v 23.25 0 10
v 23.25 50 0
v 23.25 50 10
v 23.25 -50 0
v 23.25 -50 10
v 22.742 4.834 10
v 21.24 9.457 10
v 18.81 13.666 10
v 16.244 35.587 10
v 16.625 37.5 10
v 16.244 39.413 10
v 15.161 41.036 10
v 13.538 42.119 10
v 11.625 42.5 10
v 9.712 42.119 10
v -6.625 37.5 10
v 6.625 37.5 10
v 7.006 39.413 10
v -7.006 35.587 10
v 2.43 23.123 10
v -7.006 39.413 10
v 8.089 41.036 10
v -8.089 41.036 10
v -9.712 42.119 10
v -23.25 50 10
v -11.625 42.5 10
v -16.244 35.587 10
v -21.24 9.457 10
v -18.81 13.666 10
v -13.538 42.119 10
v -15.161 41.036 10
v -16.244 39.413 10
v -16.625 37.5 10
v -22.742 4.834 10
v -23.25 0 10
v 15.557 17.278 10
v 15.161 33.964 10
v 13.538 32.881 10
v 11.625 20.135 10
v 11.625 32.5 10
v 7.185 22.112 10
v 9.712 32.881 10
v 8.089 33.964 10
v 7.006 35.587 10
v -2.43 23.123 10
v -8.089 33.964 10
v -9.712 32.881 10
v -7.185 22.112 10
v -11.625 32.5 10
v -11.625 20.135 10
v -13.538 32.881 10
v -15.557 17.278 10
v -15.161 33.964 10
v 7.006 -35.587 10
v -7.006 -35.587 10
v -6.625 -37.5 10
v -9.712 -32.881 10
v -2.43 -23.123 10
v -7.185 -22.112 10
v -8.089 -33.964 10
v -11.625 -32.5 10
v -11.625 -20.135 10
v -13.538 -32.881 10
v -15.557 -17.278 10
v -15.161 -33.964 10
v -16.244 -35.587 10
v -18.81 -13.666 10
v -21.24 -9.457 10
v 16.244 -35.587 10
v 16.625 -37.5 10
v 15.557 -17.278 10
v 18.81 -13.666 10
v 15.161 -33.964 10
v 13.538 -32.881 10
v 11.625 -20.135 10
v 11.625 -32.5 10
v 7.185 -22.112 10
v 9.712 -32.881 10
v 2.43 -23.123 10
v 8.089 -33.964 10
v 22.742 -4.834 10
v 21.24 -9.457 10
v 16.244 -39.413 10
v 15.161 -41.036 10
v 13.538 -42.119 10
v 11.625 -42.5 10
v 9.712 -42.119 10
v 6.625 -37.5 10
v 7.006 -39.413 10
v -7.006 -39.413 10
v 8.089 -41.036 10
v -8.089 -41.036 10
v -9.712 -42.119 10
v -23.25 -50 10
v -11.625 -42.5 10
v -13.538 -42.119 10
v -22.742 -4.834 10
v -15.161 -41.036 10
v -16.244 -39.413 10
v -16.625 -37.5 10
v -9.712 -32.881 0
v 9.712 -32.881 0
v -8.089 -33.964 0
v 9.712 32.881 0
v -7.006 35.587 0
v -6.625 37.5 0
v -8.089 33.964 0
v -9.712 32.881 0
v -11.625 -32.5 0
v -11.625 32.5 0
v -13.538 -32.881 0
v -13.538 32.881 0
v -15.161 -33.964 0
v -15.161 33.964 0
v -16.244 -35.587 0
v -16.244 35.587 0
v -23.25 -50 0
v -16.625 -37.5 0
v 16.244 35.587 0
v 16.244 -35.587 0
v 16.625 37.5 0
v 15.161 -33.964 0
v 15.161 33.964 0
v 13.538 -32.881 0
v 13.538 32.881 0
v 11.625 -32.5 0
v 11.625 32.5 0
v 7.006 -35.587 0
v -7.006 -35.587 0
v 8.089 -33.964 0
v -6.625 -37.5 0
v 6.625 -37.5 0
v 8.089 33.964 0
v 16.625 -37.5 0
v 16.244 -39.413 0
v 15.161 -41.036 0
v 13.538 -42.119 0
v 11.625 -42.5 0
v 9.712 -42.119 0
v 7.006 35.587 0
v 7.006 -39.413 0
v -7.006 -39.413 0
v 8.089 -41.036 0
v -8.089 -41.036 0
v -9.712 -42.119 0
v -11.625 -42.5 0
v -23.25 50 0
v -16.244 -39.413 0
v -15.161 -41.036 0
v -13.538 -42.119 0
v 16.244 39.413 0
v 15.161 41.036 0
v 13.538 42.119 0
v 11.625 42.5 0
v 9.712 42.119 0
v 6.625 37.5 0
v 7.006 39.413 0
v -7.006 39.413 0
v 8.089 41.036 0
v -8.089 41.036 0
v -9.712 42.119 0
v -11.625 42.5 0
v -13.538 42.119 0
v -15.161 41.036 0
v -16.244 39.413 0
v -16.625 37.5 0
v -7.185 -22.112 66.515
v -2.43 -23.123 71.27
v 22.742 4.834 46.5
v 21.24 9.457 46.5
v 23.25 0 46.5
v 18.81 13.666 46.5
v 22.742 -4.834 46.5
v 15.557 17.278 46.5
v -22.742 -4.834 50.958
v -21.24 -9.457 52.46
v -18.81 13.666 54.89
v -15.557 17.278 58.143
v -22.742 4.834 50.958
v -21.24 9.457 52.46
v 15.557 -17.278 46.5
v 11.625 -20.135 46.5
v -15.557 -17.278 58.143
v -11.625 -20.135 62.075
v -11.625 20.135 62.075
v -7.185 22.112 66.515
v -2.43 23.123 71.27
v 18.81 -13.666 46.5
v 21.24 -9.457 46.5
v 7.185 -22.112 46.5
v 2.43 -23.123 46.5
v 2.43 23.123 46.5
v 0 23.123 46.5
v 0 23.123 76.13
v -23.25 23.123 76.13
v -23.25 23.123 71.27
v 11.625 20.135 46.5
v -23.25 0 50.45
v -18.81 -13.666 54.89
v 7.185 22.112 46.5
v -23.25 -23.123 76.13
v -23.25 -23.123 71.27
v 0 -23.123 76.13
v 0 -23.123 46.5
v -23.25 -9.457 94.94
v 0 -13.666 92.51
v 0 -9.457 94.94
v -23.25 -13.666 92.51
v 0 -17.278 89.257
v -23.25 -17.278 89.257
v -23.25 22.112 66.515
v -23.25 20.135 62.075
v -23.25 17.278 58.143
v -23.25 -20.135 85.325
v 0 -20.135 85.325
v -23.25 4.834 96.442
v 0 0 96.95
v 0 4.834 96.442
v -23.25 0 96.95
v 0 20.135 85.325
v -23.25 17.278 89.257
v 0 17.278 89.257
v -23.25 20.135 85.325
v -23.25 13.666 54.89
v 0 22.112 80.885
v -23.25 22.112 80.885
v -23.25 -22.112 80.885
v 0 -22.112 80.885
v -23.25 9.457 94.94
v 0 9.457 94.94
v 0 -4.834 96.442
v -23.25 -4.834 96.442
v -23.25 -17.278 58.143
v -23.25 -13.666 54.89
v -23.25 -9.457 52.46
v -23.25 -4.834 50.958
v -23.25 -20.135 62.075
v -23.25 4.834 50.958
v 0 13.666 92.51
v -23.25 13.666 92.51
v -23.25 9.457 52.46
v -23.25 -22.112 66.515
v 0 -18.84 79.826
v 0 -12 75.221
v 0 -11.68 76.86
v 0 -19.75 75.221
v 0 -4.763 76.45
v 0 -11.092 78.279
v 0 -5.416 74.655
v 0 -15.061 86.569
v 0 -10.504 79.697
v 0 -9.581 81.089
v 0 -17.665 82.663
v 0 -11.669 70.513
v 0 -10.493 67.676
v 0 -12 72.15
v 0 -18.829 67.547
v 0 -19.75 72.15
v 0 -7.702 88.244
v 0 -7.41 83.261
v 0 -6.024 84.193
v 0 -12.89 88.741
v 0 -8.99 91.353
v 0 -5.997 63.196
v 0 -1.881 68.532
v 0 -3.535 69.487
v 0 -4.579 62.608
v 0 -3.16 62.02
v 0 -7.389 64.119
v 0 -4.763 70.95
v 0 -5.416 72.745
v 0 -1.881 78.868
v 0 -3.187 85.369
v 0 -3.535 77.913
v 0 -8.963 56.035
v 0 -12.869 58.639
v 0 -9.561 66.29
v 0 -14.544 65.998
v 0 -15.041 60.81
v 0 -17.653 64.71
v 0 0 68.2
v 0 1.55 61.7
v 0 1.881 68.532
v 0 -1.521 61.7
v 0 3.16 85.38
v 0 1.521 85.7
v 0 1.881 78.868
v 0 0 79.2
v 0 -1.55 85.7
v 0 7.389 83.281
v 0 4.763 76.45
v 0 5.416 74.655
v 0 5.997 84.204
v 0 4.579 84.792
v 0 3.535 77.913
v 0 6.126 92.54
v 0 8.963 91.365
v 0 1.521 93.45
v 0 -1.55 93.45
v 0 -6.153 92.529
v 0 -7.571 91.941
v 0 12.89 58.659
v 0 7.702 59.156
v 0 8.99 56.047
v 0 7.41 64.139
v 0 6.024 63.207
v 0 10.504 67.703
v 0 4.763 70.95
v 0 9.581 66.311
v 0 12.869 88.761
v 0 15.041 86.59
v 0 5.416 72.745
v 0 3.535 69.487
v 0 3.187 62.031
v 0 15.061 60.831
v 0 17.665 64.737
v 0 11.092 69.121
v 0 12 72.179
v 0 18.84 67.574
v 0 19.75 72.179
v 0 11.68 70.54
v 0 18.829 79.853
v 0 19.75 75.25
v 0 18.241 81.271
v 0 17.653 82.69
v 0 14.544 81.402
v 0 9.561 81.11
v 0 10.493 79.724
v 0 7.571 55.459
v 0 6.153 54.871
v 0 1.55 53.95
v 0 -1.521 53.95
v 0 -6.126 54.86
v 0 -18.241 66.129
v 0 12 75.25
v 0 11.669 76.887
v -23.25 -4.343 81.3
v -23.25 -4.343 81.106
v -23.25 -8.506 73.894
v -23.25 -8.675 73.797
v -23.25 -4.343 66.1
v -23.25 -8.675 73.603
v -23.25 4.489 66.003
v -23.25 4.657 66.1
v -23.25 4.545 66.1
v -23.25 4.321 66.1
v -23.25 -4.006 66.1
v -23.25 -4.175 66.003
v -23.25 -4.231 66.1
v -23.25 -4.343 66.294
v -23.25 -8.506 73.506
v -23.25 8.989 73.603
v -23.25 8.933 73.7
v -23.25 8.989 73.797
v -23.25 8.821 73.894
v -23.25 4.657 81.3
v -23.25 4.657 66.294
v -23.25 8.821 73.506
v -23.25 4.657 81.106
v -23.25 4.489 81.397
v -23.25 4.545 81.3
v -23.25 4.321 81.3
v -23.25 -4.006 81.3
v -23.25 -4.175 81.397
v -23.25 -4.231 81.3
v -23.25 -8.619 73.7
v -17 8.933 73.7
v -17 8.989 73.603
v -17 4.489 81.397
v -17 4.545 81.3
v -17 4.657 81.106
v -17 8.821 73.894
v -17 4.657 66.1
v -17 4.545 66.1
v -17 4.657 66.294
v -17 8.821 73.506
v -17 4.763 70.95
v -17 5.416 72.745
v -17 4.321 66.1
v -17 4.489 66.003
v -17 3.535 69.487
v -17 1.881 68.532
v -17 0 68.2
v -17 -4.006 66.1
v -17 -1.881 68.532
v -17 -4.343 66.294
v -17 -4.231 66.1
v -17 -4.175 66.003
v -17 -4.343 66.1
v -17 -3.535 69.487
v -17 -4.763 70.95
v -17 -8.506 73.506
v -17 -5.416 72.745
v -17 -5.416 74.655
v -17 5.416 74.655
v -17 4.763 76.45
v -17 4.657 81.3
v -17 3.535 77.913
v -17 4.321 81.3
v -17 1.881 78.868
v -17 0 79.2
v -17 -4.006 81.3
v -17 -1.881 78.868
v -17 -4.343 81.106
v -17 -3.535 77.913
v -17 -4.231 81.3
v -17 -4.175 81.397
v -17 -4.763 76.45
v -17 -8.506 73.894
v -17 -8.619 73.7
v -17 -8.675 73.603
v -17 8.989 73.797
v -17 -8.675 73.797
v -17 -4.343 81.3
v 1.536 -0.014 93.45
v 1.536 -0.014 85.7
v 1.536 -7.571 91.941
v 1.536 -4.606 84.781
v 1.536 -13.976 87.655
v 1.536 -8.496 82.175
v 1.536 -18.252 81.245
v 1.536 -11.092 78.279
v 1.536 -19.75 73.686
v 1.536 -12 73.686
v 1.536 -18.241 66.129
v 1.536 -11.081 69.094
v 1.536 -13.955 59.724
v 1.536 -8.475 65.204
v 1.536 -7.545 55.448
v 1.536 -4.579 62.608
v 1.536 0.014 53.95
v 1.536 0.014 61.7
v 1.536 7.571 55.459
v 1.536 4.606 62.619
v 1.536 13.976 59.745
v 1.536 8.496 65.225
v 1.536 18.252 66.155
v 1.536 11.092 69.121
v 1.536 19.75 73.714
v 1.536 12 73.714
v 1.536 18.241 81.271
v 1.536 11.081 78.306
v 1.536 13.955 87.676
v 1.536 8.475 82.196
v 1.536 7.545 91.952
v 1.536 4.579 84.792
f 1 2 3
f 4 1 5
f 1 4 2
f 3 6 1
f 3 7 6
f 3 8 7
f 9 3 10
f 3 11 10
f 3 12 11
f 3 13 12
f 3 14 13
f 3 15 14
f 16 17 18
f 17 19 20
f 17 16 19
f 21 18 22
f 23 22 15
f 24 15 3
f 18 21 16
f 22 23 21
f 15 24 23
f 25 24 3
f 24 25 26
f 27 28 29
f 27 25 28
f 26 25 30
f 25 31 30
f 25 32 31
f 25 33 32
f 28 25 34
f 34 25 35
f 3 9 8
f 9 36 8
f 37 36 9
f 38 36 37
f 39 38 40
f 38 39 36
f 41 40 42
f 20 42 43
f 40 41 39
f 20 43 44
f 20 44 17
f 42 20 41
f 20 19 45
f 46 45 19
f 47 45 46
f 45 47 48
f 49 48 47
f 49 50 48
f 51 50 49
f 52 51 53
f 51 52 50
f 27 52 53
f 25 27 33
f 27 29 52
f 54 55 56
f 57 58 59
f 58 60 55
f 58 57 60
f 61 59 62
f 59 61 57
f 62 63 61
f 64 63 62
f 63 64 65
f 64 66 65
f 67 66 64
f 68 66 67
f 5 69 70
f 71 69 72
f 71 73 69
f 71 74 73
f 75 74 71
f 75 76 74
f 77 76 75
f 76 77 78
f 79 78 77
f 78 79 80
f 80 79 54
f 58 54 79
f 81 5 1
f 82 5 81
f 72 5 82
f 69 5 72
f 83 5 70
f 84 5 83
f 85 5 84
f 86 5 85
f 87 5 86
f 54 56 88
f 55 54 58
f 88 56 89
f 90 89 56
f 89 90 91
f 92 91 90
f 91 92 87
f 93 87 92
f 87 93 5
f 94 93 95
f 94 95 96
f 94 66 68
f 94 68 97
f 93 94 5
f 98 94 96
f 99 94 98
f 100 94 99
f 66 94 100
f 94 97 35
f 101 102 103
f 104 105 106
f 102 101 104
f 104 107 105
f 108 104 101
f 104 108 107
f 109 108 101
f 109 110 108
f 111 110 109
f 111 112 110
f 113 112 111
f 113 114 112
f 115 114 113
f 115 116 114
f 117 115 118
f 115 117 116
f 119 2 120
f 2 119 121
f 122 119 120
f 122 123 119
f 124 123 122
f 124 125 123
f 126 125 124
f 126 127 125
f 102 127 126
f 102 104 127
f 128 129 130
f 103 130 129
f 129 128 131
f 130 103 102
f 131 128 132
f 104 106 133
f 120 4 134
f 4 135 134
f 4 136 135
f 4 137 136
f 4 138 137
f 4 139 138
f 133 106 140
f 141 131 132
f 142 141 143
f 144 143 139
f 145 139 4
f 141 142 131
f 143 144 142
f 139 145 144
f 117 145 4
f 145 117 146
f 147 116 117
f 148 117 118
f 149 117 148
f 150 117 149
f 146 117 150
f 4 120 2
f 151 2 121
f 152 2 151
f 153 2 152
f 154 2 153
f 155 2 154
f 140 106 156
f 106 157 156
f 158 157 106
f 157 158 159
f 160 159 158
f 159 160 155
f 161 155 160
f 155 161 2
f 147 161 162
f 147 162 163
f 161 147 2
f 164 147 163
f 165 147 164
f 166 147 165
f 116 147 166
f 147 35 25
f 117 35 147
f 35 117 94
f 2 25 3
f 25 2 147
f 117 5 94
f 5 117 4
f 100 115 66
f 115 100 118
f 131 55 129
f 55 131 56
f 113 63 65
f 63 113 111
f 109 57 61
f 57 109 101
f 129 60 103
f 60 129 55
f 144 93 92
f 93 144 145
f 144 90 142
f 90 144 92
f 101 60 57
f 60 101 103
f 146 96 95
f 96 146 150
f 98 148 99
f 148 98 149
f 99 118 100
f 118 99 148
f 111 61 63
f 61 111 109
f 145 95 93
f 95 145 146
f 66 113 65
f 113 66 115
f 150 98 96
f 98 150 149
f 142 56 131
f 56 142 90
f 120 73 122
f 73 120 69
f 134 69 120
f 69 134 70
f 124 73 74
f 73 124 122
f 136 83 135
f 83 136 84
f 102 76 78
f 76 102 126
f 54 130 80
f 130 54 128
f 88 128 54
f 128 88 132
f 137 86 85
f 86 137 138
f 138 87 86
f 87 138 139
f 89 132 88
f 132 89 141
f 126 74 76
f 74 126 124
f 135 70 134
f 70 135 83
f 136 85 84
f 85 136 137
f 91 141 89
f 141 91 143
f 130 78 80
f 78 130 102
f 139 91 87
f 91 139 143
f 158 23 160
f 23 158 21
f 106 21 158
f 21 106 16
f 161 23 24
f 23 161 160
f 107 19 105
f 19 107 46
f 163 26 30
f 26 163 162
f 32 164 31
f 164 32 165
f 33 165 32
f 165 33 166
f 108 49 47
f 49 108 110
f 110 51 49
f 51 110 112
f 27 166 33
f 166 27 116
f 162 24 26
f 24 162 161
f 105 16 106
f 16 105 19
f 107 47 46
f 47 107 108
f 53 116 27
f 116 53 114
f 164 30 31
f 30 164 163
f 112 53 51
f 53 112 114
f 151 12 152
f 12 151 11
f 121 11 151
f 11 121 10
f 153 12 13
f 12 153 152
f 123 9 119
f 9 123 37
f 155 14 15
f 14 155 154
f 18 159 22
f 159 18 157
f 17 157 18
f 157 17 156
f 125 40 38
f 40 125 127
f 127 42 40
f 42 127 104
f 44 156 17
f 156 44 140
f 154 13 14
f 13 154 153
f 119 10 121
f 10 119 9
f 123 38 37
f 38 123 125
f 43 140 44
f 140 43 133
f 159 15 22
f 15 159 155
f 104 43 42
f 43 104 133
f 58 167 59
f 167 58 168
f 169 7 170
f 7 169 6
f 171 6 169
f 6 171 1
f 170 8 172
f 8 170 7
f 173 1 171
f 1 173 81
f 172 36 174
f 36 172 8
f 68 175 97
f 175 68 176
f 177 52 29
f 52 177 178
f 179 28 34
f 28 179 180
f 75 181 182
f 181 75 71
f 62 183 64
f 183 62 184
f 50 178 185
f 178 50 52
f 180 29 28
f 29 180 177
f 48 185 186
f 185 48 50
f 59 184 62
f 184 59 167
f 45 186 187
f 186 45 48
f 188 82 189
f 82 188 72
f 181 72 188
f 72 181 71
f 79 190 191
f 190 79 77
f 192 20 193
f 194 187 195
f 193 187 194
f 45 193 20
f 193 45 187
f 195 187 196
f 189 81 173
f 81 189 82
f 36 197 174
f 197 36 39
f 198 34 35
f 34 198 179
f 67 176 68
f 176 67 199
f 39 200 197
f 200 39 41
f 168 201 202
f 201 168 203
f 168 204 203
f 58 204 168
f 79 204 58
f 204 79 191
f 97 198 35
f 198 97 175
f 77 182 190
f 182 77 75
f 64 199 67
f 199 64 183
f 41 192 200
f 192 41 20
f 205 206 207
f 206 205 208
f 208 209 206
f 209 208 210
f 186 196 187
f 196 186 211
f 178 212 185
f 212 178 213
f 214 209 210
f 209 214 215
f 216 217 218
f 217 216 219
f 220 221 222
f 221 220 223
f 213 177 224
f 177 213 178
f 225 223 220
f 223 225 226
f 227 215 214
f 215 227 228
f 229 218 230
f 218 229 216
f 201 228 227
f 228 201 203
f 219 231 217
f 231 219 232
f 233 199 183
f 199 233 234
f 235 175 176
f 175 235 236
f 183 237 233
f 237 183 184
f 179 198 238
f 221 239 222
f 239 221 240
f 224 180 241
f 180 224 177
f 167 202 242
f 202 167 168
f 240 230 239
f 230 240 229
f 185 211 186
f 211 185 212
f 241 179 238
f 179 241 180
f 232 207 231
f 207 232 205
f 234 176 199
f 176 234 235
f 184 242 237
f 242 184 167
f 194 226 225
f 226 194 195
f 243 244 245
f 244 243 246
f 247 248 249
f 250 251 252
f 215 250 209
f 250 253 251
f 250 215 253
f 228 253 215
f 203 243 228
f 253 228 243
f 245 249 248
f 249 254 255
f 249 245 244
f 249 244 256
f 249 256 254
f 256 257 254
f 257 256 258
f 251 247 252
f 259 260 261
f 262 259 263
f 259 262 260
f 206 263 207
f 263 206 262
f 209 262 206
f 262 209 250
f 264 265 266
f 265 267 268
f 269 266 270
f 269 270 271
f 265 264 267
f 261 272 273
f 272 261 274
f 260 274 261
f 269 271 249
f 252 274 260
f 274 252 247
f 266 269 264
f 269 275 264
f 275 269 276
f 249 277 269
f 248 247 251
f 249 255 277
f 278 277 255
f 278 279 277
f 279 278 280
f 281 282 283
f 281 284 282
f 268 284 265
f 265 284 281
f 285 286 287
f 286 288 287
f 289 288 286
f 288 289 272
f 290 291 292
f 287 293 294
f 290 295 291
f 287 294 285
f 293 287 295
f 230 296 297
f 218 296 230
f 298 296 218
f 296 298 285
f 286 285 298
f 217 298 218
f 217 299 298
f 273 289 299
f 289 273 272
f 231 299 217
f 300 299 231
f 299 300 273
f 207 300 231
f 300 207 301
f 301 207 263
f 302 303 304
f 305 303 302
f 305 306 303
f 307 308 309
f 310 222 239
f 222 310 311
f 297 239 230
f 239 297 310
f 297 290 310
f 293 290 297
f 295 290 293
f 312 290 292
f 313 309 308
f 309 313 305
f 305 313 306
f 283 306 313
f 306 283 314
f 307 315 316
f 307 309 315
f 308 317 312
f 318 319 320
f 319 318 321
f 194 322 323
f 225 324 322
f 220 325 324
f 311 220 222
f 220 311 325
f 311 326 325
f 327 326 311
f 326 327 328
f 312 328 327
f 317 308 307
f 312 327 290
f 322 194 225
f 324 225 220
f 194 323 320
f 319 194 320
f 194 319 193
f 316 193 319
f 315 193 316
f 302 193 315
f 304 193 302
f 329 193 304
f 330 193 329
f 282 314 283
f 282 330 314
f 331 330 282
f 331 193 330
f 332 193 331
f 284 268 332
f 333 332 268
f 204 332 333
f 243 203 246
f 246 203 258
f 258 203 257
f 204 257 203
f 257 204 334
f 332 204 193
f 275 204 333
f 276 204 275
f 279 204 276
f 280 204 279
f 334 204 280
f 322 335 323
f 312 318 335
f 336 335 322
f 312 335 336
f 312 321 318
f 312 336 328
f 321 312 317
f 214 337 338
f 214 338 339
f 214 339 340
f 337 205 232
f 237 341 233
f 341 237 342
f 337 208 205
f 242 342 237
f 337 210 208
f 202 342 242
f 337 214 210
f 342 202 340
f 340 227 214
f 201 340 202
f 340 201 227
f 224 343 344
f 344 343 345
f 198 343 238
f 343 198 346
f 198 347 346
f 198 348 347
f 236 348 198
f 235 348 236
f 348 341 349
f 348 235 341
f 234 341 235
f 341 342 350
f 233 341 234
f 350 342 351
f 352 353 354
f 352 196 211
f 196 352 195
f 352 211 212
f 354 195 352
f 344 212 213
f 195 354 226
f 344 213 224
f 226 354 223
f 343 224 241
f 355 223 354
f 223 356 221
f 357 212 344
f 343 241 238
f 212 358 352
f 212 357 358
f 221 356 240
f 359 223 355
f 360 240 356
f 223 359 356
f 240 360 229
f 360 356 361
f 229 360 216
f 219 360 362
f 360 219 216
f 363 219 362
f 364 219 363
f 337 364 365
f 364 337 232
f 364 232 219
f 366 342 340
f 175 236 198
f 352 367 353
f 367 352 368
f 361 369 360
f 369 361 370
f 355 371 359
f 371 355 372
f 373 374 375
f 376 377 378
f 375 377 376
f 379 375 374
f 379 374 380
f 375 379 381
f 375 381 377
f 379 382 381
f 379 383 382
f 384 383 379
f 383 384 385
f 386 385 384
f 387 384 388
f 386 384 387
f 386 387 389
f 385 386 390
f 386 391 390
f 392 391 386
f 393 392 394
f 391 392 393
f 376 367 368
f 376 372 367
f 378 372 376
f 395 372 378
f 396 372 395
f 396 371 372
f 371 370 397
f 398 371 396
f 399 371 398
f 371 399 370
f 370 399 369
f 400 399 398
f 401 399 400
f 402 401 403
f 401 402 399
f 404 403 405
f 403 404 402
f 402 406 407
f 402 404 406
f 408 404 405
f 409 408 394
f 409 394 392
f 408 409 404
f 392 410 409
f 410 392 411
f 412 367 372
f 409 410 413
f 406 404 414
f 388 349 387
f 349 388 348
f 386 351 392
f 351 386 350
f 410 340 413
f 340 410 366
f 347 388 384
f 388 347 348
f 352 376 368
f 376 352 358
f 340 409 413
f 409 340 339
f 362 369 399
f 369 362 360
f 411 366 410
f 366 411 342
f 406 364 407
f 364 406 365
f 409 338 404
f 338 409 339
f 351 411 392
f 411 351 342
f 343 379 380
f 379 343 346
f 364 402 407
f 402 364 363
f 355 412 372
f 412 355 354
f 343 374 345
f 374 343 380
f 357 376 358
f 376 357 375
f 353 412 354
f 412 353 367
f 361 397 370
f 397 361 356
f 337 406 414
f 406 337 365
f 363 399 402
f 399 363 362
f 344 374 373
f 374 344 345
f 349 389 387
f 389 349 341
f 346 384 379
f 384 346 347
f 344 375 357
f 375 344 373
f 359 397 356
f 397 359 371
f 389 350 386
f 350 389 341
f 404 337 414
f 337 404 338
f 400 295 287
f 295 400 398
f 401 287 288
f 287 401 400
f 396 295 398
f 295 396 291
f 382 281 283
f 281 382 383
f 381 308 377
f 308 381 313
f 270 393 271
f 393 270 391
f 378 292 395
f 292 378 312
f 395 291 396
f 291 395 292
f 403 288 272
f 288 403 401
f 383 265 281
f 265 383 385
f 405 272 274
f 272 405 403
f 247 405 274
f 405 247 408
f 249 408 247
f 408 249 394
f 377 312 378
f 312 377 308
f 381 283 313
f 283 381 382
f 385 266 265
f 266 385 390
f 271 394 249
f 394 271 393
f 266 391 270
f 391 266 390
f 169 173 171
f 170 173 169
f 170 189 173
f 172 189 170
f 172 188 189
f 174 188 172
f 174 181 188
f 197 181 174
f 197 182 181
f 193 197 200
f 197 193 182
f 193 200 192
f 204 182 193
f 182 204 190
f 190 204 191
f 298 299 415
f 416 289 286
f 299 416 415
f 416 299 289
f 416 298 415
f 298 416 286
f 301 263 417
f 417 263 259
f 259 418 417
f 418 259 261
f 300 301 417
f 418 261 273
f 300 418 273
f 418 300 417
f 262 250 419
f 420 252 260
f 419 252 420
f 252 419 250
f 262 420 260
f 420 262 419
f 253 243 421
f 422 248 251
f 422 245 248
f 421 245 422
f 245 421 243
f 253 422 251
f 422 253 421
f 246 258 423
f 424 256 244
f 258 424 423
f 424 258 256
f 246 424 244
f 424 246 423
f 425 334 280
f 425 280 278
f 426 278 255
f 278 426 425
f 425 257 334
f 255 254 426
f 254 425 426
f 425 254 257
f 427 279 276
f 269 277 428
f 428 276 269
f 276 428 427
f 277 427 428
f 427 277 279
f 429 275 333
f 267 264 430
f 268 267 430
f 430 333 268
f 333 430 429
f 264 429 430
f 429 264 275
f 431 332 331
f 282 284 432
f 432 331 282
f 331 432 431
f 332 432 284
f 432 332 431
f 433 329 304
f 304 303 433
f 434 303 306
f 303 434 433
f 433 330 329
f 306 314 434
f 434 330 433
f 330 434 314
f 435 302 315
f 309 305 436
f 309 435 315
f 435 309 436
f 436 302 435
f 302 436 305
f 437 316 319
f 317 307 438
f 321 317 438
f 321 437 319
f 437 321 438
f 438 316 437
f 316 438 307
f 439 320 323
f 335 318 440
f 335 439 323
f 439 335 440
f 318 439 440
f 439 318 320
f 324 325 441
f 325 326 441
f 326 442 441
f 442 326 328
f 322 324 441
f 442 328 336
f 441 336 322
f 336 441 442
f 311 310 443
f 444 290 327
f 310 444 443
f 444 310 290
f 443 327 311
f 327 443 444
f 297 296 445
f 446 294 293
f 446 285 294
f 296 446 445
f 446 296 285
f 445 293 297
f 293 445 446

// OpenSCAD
/*

    WIP Joint for connecting two lenths of PVC pipe at adjustable angles.
    
    Print with pipe opening down for best bed adhesion, lowest pipe opening
    distortion and strongest teeth.  
    
    Lots of testing remains to get fitings and clearances correct, and also
    needs work on being properly parametric as well as field testing for 
    strength, durability, etc. (details in TODO's below).

*/

// TODO: Increase negative tooth depth, consider increasing tooth size, reducing tooth count
// TODO: Fix parametrics (maybe just don't resize anything but the pipe openings for now?)
// TODO: Create a third end type that can sandwich-in to create n-ended joints
// TODO: Extract rotate_about into a separate utility module file
// TOOD: Extract the bolt into a separate reusable module file
// TODO: Make bolt size more parametric

// Globals
TOLERANCE = 1;

// Rotates object around specified point
module rotate_about_pt(z, y, pt) {
    translate(pt)
        rotate([0, y, z])
            translate(-pt)
                children();   
}

// 3/8" bolt 
// l pareamter determines the overall length of the bolt
// t parameter increases dimensions to compensate for printer tolerance
module bolt(l, t){
    
    BOLT_LENGTH = l;
    HEAD_LENGTH = 14.2 + t;
    HEAD_WIDTH = 8 + t;
    HEAD_HEIGHT = 6 + t;
    SHAFT_DIAMETER = 10 + t;
    
    cylinder(r=SHAFT_DIAMETER/2,h=BOLT_LENGTH);
    translate([-HEAD_LENGTH/2,-HEAD_LENGTH/3.5,BOLT_LENGTH-HEAD_HEIGHT]){        
        cube([HEAD_LENGTH, HEAD_WIDTH, HEAD_HEIGHT]);
        rotate_about_pt(60,0,[HEAD_LENGTH/2,HEAD_WIDTH/2,0]){
            cube([HEAD_LENGTH, HEAD_WIDTH, HEAD_HEIGHT]);
            rotate_about_pt(60,0,[HEAD_LENGTH/2,HEAD_WIDTH/2,0]){
                cube([HEAD_LENGTH, HEAD_WIDTH, HEAD_HEIGHT]);
            }
        }
    }
}

// Adjustable joint for 1" PVC
// teeth parameter determines if this is the end with teeth
// count parameter determines the number of teeth
module pvc_joint_wallmount(count) {

    PIPE_OD = 33.5; //34; //25.5;
    //PIPE_OD = 21.61;
    WALL_THICKNESS = 13;
    OUTER_SHELL_OD = PIPE_OD+WALL_THICKNESS;
    JOINT_BOLT_LENGTH = 50; // ~2" ???
    PIPE_BOLT_LENGTH = 57;  // ~2.25" ???
    SOCKET_OD = 24;         // Diameter of socket used to tighten joint

    // TODO: Clean-up the variables we no longer need above
    // Foot vars
    FOOT_LENGTH = 100;
    FOOT_WIDTH = OUTER_SHELL_OD;
    FOOT_HEIGHT = 10;
    FOOT_BOLT_DIAMETER = 10;
    
    difference(){
        union(){
            
            // Main outer shell
            cylinder(r=OUTER_SHELL_OD/2, h=OUTER_SHELL_OD*1.6);
            
            // Foot plate
            translate([-FOOT_WIDTH/2,-FOOT_LENGTH/2,0]){
                difference(){
                    cube([FOOT_WIDTH,FOOT_LENGTH,FOOT_HEIGHT]);
                    
                    // Mounting fastener holes
                    translate([FOOT_WIDTH/4,FOOT_LENGTH/8,0]){
                        #cylinder(r=FOOT_BOLT_DIAMETER/2,h=10);
                    }
                    translate([FOOT_WIDTH-(FOOT_WIDTH/4),FOOT_LENGTH/8,0]){
                        #cylinder(r=FOOT_BOLT_DIAMETER/2,h=10);
                    }
                    translate([FOOT_WIDTH/4,FOOT_LENGTH-(FOOT_LENGTH/8),0]){
                        #cylinder(r=FOOT_BOLT_DIAMETER/2,h=10);
                    }
                    translate([FOOT_WIDTH-(FOOT_WIDTH/4),FOOT_LENGTH-(FOOT_LENGTH/8),0]){
                        #cylinder(r=FOOT_BOLT_DIAMETER/2,h=10);
                    }
                }
            }
            
            // Joint
             translate([0,0,PIPE_OD*2.2]){
                rotate([0,-90,0]){
                    cylinder(r=OUTER_SHELL_OD/2,h=OUTER_SHELL_OD/2);
                }
            }
            
            /*
            // Cylinder for the pipe bolt nut to tighten against
            translate([0,OUTER_SHELL_OD/2,PIPE_OD/2]){
                    rotate([90,0,0]){
                        cylinder(r=10,h=PIPE_OD);
                }
            }
            */
        }        
        
        /*
        // Pipe opening
        cylinder(r=(PIPE_OD+TOLERANCE)/2, h=PIPE_OD);
        
        // Pipe bolt hole
        // NOTE: "10" is kind of a magic number here, it will vary
        // depending on the size of the bolt head, which is fixed
        // for now but once this is fully parametric will need to change
        #translate([0,PIPE_BOLT_LENGTH-(PIPE_OD/2)-10,PIPE_OD/2]){
                rotate([90,0,0]){             
                bolt(PIPE_BOLT_LENGTH, TOLERANCE);
            }
        }
        */
        
        // Cut-away
        translate([0,-OUTER_SHELL_OD/2,OUTER_SHELL_OD]){
            cube([PIPE_OD,OUTER_SHELL_OD,PIPE_OD*2]);
        }        
                
        // If this end has teeth, cut the bolt hole
        // and countersink the head
        //if (teeth){
            
            // Joint bolt hole
            translate([26,0,PIPE_OD*2.2]){
                rotate([0,-90,0]){
                    bolt(JOINT_BOLT_LENGTH, TOLERANCE);
                }
            }
         /*   
        } else {
            
            // If this is the end without teeth, cut a 
            // hole for the bolt, a hole to countersink
            // the washer & nut and then grooves for the teeth
            
            // Joint bolt hole
            translate([5,0,PIPE_OD*2.2]){
                rotate([0,-90,0]){
                    bolt(JOINT_BOLT_LENGTH, TOLERANCE);
                }
            }
            
            // Joint nut & washer countersink
            // SOCKET_OD should accomodate putting a socket
            // on the nut to tighten the joint
            translate([-OUTER_SHELL_OD/3,0,PIPE_OD*2.2]){
                rotate([0,-90,0]){
                    cylinder(r=(SOCKET_OD+TOLERANCE)/2,h=PIPE_OD/2);
                }
            }            
            
            // Grooves for the teeth
            translate([1.5,0,PIPE_OD*2.2]){                
                for(i=[0:count]){
                    rotate([i*(360/count),0,0]){
                        translate([0,-3.55,11.5]){
                            rotate([0,0,45]){
                                cube([5,5,OUTER_SHELL_OD/5]);
                            }
                        }
                    }
                }
            }             
        }
        */
    }

    // Teeth
    //if (teeth){
        translate([-2,0,PIPE_OD*2.2]){
            for(i=[0:count]){
                rotate([i*(360/count),0,0]){
                    translate([0,-3.55,12]){
                        rotate([0,0,45]){
                            cube([5,5,OUTER_SHELL_OD/6]);
                        }
                    }
                }
            }
        }
    //}
}

// Sample layout
pvc_joint_wallmount(count=16);

/*
// Two-way joint
color("blue"){
    translate([10,0,149.5]){
        rotate([180,0,0]){
            rotate([0,0,180]){
                pvc_joint(teeth=true, count=20);
            }
        }
    }
}
*/

/*
// Ruler
translate([25,0,0]){
    cube([10,10,127.5]);
}
*/
